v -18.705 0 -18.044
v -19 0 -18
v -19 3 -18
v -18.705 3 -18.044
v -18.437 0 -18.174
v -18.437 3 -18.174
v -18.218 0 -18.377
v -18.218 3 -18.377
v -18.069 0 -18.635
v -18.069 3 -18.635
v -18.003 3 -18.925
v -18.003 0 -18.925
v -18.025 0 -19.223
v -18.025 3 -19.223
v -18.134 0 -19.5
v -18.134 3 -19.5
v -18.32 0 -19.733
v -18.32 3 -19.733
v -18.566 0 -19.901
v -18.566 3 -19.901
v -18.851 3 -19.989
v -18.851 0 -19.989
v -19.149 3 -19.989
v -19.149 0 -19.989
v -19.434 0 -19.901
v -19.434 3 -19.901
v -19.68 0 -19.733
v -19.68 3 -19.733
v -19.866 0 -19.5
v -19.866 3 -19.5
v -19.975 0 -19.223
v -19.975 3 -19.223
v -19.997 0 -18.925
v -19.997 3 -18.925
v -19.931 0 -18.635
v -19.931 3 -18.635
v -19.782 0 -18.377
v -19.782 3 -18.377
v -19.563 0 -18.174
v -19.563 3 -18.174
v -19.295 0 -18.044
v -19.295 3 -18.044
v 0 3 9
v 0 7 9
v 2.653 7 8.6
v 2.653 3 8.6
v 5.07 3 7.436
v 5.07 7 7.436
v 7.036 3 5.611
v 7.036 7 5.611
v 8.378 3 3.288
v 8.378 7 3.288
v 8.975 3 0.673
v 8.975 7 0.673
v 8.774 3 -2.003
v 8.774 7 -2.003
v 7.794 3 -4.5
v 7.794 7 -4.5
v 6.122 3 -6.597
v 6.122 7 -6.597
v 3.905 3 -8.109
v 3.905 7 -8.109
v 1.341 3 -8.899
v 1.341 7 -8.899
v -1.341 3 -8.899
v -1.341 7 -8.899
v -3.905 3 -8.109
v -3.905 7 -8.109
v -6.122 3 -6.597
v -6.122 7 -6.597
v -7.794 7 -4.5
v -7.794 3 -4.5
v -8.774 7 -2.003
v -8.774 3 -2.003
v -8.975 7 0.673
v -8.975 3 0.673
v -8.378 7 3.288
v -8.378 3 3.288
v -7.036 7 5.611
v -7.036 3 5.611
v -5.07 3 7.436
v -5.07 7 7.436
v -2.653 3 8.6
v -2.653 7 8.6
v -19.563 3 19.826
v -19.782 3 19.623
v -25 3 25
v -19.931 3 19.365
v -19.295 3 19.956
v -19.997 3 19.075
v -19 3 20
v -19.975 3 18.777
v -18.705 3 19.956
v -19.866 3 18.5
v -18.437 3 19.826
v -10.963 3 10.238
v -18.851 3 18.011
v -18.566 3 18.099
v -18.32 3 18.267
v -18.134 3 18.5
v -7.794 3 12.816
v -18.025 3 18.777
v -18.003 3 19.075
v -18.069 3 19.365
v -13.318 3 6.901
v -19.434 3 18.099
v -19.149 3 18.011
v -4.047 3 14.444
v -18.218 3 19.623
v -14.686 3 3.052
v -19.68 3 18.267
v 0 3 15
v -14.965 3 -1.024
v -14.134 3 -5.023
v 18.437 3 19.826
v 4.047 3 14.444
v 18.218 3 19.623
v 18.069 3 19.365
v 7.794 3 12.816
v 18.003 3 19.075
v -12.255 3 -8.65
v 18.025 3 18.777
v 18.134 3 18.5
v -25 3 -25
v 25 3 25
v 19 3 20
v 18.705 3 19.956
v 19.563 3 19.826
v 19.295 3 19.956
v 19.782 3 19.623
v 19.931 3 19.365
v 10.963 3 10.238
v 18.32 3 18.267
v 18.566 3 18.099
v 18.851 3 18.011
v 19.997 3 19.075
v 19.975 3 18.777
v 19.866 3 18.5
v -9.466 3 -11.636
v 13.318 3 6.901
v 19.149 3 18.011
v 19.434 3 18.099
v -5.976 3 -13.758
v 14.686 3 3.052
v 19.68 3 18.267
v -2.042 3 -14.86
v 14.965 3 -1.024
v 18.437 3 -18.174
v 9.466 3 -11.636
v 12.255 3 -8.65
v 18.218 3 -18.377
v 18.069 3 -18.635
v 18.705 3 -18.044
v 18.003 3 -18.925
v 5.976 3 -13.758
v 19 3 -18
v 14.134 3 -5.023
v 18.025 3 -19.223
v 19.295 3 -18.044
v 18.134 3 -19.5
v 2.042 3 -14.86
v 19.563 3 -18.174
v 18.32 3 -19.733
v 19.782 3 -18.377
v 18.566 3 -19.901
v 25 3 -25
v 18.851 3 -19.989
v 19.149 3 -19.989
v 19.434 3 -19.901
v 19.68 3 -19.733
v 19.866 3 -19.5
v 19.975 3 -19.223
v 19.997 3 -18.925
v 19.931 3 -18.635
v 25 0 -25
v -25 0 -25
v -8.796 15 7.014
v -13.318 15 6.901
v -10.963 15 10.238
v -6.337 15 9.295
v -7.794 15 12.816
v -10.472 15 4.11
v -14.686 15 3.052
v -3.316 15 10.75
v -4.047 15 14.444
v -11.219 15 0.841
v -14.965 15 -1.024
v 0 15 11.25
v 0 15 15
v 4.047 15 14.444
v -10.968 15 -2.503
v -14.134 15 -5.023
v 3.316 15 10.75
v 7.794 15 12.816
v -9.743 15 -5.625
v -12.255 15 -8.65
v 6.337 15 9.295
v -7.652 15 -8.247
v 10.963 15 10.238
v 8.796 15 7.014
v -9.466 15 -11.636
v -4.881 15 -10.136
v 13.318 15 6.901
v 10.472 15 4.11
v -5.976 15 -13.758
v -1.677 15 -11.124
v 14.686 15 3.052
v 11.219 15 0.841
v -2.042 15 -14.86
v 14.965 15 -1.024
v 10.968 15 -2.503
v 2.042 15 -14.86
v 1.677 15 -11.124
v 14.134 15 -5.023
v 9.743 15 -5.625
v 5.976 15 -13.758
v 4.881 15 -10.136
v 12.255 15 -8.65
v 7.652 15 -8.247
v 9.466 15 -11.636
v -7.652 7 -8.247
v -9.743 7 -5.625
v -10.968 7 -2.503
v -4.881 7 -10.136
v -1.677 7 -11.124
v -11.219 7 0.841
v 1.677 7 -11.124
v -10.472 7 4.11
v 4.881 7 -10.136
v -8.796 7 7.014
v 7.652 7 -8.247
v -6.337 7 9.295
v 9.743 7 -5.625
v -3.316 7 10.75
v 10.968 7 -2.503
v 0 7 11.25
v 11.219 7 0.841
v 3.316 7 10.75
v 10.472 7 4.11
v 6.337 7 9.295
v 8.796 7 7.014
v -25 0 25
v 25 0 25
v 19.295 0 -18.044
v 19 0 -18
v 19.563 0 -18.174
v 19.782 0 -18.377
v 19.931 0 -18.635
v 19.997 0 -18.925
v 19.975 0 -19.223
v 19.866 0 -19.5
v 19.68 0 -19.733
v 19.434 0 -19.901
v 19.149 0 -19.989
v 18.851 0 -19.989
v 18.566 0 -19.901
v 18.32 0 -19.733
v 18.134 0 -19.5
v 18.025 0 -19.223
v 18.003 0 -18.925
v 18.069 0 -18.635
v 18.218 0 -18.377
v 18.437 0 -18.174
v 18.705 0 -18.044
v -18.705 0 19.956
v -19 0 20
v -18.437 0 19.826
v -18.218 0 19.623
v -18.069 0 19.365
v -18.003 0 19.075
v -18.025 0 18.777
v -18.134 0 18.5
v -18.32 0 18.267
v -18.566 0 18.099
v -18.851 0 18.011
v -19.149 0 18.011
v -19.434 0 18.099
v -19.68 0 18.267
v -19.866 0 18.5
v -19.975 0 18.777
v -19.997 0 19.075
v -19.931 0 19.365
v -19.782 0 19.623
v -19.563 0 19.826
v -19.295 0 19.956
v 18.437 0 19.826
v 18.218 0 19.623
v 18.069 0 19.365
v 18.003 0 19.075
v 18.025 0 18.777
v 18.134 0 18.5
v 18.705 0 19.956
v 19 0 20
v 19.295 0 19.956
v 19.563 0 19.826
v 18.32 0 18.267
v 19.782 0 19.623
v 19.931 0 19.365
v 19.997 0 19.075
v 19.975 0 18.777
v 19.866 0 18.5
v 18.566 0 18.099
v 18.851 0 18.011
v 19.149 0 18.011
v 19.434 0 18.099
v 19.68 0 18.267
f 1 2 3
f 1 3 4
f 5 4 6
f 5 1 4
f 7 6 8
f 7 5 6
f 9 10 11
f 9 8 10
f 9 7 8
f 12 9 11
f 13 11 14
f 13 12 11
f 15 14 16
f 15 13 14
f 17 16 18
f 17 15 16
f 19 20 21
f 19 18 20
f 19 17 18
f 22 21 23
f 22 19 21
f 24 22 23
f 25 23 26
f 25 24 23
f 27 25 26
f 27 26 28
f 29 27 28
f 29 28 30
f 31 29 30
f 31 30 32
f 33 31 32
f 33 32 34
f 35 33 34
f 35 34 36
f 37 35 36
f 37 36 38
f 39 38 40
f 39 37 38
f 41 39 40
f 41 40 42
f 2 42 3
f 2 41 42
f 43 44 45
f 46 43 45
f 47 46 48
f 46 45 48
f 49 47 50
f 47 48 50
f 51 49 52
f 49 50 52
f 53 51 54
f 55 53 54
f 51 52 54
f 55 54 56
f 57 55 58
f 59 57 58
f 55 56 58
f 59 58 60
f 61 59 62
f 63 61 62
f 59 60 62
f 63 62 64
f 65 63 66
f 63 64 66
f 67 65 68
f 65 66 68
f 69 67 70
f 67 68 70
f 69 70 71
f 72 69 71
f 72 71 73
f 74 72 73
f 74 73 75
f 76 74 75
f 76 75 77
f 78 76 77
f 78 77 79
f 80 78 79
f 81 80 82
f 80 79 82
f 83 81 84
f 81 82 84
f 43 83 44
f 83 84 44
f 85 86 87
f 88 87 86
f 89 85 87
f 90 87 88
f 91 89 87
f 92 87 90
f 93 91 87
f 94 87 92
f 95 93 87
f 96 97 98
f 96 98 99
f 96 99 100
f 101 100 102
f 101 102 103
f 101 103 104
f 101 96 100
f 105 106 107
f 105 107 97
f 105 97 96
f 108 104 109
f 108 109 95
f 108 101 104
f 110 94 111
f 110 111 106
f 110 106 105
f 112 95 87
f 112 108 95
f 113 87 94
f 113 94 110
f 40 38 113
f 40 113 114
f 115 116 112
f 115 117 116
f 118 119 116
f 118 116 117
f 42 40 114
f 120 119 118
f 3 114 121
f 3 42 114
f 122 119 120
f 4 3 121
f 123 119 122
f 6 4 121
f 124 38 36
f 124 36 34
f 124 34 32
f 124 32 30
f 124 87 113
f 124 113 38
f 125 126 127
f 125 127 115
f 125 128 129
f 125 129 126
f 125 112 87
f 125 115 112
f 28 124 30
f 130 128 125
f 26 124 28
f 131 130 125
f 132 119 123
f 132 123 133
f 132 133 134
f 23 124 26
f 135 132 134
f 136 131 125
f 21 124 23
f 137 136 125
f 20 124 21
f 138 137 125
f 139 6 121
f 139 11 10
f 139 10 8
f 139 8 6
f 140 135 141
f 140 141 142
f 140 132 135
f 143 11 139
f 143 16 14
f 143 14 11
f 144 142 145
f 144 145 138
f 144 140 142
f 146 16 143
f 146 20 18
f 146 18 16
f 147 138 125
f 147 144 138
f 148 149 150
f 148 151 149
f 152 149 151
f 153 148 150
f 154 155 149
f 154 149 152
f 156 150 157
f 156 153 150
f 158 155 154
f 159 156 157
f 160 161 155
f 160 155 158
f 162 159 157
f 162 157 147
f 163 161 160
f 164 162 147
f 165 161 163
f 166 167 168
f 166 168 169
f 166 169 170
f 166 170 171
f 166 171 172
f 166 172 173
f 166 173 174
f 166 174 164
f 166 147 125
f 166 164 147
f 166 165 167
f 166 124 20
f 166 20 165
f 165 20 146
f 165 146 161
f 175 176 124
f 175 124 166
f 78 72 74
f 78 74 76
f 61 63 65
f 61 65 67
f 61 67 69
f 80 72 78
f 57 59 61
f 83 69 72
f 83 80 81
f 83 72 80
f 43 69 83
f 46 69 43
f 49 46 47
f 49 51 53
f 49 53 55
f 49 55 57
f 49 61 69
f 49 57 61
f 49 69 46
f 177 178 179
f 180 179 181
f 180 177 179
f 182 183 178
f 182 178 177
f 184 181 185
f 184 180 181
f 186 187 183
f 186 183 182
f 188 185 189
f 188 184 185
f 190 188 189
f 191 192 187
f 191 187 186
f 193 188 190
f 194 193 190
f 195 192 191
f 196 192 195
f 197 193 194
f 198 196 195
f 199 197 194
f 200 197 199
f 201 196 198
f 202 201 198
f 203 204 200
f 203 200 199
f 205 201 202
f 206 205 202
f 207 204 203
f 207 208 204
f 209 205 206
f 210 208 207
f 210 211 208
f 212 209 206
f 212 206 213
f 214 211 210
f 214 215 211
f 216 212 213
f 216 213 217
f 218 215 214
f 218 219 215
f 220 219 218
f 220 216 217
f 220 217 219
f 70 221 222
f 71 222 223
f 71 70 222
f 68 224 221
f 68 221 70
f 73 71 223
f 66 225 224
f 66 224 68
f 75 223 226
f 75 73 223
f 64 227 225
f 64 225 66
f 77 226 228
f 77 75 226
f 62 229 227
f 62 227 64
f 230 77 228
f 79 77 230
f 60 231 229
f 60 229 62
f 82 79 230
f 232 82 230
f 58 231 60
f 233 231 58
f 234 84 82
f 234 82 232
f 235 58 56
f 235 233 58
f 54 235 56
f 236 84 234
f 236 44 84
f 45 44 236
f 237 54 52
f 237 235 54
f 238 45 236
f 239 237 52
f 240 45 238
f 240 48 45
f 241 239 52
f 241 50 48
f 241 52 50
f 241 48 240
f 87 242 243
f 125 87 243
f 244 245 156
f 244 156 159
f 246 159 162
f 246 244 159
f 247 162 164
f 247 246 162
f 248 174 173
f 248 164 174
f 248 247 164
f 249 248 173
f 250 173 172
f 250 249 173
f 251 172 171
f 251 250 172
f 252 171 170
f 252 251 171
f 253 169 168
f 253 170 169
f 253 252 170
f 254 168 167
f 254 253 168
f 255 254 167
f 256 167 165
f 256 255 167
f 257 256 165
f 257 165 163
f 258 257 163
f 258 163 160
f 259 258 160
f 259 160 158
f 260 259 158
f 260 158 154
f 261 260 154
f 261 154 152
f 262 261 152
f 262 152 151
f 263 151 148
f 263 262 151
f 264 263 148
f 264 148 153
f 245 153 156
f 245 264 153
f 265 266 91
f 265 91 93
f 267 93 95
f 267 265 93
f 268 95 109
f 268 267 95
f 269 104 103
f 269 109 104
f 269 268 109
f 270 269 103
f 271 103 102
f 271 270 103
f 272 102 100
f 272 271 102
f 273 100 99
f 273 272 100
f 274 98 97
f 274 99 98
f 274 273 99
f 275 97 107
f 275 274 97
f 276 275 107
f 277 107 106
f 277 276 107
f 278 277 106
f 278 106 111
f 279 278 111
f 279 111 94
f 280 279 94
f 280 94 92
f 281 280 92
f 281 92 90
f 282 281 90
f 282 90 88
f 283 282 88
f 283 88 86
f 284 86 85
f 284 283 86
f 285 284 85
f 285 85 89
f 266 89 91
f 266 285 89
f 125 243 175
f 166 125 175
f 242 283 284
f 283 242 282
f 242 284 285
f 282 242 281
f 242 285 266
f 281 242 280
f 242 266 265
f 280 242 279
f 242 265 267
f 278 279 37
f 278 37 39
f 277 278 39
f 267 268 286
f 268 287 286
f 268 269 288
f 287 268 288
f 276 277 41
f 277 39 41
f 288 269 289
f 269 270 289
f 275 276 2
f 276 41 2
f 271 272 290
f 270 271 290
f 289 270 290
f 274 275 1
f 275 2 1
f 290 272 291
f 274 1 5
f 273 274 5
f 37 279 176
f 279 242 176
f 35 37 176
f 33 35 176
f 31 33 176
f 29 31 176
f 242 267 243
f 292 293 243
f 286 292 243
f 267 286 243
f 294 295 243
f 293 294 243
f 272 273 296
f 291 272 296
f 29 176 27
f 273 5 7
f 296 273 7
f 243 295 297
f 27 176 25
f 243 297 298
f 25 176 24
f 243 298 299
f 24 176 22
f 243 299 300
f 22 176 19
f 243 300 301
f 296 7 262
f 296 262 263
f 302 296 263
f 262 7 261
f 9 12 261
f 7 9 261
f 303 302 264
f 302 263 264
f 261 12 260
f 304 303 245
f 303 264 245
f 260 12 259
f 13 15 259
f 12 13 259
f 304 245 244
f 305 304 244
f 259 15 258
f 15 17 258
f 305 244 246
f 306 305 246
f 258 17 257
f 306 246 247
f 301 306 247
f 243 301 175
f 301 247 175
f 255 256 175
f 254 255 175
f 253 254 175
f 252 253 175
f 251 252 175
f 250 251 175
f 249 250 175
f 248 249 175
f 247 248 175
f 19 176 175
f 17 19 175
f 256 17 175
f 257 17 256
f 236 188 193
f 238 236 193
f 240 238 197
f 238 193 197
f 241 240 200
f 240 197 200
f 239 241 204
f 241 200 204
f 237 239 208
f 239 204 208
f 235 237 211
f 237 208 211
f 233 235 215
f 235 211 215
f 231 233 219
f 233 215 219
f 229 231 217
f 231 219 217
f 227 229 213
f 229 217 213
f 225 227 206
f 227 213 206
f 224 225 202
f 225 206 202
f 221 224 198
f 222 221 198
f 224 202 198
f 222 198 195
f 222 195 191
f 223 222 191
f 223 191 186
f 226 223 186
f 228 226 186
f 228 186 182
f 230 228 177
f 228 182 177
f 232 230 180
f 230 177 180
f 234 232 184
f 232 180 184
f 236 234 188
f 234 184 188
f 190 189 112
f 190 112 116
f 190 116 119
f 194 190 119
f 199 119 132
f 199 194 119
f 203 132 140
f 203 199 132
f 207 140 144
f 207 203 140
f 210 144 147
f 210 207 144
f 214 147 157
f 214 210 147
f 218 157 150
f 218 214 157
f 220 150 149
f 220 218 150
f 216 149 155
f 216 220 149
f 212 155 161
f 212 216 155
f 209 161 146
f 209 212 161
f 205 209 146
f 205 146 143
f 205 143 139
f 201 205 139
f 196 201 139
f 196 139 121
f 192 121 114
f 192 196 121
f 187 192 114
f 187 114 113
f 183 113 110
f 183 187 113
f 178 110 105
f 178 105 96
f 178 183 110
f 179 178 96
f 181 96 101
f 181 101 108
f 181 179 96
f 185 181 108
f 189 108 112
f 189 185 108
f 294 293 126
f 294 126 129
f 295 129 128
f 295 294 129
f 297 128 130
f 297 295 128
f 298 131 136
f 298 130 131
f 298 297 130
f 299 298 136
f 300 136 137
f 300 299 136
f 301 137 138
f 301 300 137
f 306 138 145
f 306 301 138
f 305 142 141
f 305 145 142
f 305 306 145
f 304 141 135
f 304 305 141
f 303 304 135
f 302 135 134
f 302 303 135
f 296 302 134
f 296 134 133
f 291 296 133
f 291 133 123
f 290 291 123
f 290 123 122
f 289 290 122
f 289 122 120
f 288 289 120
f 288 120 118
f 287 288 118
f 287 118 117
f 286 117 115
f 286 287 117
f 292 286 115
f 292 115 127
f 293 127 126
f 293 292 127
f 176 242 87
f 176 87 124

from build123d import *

# Parameters (mm, degrees)
SKETCH2_W               = 50
SKETCH2_H               = 50
BOSS_EXTRUDE1_DEPTH     = 15
SKETCH3_R               = 11.25
CUT_EXTRUDE1_DEPTH      = 8
SKETCH4_R               = 9
CUT_EXTRUDE2_DEPTH      = 4
SKETCH5_W               = 50
SKETCH5_H               = 50
SKETCH5_R               = 15
CUT_EXTRUDE3_DEPTH      = 12
CUT_EXTRUDE4_DEPTH      = 38.336309405
CUT_EXTRUDE4_DEPTH_BACK = 38.336309405
SKETCH6_R               = 1


with BuildPart() as part:
    # Sketch2 → Boss-Extrude1 (new body)
    with BuildSketch(Plane(origin=(0, 0, 0), x_dir=(1, 0, 0), z_dir=(0, 1, 0))):
        Rectangle(SKETCH2_W, SKETCH2_H)
    extrude(amount=BOSS_EXTRUDE1_DEPTH)

    # Sketch3 → Cut-Extrude1 (cut)
    with BuildSketch(Plane(origin=(0, 15, 0), x_dir=(1, 0, 0), z_dir=(0, 1, 0))):
        with Locations(Location((0, 0, 0), (0, 0, 270))):
            Circle(SKETCH3_R)
    extrude(amount=-CUT_EXTRUDE1_DEPTH, mode=Mode.SUBTRACT)

    # Sketch4 → Cut-Extrude2 (cut)
    with BuildSketch(Plane(origin=(0, 7, 0), x_dir=(1, 0, 0), z_dir=(0, 1, 0))):
        with Locations(Location((0, 0, 0), (0, 0, 270))):
            Circle(SKETCH4_R)
    extrude(amount=-CUT_EXTRUDE2_DEPTH, mode=Mode.SUBTRACT)

    # Sketch5 → Cut-Extrude3 (cut)
    with BuildSketch(Plane(origin=(0, 15, 0), x_dir=(1, 0, 0), z_dir=(0, 1, 0))):
        Rectangle(SKETCH5_W, SKETCH5_H)
        with Locations(Location((0, 0, 0), (0, 0, 270))):
            Circle(SKETCH5_R, mode=Mode.SUBTRACT)
    extrude(amount=-CUT_EXTRUDE3_DEPTH, mode=Mode.SUBTRACT)

    # Sketch6 → Cut-Extrude4 (cut, two sides: drawn at the far end of the back side and taken through both)
    with BuildSketch(Plane(origin=(0, 3, 0), x_dir=(1, 0, 0), z_dir=(0, 1, 0)).offset(-CUT_EXTRUDE4_DEPTH_BACK)):
        with Locations(Location((-19, 19, 0), (0, 0, 270))):
            Circle(SKETCH6_R)
        with Locations(Location((19, 19, 0), (0, 0, 270))):
            Circle(SKETCH6_R)
        with Locations(Location((19, -19, 0), (0, 0, 270))):
            Circle(SKETCH6_R)
        with Locations(Location((-19, -19, 0), (0, 0, 270))):
            Circle(SKETCH6_R)
    extrude(amount=CUT_EXTRUDE4_DEPTH + CUT_EXTRUDE4_DEPTH_BACK, mode=Mode.SUBTRACT)


solid = part.part
